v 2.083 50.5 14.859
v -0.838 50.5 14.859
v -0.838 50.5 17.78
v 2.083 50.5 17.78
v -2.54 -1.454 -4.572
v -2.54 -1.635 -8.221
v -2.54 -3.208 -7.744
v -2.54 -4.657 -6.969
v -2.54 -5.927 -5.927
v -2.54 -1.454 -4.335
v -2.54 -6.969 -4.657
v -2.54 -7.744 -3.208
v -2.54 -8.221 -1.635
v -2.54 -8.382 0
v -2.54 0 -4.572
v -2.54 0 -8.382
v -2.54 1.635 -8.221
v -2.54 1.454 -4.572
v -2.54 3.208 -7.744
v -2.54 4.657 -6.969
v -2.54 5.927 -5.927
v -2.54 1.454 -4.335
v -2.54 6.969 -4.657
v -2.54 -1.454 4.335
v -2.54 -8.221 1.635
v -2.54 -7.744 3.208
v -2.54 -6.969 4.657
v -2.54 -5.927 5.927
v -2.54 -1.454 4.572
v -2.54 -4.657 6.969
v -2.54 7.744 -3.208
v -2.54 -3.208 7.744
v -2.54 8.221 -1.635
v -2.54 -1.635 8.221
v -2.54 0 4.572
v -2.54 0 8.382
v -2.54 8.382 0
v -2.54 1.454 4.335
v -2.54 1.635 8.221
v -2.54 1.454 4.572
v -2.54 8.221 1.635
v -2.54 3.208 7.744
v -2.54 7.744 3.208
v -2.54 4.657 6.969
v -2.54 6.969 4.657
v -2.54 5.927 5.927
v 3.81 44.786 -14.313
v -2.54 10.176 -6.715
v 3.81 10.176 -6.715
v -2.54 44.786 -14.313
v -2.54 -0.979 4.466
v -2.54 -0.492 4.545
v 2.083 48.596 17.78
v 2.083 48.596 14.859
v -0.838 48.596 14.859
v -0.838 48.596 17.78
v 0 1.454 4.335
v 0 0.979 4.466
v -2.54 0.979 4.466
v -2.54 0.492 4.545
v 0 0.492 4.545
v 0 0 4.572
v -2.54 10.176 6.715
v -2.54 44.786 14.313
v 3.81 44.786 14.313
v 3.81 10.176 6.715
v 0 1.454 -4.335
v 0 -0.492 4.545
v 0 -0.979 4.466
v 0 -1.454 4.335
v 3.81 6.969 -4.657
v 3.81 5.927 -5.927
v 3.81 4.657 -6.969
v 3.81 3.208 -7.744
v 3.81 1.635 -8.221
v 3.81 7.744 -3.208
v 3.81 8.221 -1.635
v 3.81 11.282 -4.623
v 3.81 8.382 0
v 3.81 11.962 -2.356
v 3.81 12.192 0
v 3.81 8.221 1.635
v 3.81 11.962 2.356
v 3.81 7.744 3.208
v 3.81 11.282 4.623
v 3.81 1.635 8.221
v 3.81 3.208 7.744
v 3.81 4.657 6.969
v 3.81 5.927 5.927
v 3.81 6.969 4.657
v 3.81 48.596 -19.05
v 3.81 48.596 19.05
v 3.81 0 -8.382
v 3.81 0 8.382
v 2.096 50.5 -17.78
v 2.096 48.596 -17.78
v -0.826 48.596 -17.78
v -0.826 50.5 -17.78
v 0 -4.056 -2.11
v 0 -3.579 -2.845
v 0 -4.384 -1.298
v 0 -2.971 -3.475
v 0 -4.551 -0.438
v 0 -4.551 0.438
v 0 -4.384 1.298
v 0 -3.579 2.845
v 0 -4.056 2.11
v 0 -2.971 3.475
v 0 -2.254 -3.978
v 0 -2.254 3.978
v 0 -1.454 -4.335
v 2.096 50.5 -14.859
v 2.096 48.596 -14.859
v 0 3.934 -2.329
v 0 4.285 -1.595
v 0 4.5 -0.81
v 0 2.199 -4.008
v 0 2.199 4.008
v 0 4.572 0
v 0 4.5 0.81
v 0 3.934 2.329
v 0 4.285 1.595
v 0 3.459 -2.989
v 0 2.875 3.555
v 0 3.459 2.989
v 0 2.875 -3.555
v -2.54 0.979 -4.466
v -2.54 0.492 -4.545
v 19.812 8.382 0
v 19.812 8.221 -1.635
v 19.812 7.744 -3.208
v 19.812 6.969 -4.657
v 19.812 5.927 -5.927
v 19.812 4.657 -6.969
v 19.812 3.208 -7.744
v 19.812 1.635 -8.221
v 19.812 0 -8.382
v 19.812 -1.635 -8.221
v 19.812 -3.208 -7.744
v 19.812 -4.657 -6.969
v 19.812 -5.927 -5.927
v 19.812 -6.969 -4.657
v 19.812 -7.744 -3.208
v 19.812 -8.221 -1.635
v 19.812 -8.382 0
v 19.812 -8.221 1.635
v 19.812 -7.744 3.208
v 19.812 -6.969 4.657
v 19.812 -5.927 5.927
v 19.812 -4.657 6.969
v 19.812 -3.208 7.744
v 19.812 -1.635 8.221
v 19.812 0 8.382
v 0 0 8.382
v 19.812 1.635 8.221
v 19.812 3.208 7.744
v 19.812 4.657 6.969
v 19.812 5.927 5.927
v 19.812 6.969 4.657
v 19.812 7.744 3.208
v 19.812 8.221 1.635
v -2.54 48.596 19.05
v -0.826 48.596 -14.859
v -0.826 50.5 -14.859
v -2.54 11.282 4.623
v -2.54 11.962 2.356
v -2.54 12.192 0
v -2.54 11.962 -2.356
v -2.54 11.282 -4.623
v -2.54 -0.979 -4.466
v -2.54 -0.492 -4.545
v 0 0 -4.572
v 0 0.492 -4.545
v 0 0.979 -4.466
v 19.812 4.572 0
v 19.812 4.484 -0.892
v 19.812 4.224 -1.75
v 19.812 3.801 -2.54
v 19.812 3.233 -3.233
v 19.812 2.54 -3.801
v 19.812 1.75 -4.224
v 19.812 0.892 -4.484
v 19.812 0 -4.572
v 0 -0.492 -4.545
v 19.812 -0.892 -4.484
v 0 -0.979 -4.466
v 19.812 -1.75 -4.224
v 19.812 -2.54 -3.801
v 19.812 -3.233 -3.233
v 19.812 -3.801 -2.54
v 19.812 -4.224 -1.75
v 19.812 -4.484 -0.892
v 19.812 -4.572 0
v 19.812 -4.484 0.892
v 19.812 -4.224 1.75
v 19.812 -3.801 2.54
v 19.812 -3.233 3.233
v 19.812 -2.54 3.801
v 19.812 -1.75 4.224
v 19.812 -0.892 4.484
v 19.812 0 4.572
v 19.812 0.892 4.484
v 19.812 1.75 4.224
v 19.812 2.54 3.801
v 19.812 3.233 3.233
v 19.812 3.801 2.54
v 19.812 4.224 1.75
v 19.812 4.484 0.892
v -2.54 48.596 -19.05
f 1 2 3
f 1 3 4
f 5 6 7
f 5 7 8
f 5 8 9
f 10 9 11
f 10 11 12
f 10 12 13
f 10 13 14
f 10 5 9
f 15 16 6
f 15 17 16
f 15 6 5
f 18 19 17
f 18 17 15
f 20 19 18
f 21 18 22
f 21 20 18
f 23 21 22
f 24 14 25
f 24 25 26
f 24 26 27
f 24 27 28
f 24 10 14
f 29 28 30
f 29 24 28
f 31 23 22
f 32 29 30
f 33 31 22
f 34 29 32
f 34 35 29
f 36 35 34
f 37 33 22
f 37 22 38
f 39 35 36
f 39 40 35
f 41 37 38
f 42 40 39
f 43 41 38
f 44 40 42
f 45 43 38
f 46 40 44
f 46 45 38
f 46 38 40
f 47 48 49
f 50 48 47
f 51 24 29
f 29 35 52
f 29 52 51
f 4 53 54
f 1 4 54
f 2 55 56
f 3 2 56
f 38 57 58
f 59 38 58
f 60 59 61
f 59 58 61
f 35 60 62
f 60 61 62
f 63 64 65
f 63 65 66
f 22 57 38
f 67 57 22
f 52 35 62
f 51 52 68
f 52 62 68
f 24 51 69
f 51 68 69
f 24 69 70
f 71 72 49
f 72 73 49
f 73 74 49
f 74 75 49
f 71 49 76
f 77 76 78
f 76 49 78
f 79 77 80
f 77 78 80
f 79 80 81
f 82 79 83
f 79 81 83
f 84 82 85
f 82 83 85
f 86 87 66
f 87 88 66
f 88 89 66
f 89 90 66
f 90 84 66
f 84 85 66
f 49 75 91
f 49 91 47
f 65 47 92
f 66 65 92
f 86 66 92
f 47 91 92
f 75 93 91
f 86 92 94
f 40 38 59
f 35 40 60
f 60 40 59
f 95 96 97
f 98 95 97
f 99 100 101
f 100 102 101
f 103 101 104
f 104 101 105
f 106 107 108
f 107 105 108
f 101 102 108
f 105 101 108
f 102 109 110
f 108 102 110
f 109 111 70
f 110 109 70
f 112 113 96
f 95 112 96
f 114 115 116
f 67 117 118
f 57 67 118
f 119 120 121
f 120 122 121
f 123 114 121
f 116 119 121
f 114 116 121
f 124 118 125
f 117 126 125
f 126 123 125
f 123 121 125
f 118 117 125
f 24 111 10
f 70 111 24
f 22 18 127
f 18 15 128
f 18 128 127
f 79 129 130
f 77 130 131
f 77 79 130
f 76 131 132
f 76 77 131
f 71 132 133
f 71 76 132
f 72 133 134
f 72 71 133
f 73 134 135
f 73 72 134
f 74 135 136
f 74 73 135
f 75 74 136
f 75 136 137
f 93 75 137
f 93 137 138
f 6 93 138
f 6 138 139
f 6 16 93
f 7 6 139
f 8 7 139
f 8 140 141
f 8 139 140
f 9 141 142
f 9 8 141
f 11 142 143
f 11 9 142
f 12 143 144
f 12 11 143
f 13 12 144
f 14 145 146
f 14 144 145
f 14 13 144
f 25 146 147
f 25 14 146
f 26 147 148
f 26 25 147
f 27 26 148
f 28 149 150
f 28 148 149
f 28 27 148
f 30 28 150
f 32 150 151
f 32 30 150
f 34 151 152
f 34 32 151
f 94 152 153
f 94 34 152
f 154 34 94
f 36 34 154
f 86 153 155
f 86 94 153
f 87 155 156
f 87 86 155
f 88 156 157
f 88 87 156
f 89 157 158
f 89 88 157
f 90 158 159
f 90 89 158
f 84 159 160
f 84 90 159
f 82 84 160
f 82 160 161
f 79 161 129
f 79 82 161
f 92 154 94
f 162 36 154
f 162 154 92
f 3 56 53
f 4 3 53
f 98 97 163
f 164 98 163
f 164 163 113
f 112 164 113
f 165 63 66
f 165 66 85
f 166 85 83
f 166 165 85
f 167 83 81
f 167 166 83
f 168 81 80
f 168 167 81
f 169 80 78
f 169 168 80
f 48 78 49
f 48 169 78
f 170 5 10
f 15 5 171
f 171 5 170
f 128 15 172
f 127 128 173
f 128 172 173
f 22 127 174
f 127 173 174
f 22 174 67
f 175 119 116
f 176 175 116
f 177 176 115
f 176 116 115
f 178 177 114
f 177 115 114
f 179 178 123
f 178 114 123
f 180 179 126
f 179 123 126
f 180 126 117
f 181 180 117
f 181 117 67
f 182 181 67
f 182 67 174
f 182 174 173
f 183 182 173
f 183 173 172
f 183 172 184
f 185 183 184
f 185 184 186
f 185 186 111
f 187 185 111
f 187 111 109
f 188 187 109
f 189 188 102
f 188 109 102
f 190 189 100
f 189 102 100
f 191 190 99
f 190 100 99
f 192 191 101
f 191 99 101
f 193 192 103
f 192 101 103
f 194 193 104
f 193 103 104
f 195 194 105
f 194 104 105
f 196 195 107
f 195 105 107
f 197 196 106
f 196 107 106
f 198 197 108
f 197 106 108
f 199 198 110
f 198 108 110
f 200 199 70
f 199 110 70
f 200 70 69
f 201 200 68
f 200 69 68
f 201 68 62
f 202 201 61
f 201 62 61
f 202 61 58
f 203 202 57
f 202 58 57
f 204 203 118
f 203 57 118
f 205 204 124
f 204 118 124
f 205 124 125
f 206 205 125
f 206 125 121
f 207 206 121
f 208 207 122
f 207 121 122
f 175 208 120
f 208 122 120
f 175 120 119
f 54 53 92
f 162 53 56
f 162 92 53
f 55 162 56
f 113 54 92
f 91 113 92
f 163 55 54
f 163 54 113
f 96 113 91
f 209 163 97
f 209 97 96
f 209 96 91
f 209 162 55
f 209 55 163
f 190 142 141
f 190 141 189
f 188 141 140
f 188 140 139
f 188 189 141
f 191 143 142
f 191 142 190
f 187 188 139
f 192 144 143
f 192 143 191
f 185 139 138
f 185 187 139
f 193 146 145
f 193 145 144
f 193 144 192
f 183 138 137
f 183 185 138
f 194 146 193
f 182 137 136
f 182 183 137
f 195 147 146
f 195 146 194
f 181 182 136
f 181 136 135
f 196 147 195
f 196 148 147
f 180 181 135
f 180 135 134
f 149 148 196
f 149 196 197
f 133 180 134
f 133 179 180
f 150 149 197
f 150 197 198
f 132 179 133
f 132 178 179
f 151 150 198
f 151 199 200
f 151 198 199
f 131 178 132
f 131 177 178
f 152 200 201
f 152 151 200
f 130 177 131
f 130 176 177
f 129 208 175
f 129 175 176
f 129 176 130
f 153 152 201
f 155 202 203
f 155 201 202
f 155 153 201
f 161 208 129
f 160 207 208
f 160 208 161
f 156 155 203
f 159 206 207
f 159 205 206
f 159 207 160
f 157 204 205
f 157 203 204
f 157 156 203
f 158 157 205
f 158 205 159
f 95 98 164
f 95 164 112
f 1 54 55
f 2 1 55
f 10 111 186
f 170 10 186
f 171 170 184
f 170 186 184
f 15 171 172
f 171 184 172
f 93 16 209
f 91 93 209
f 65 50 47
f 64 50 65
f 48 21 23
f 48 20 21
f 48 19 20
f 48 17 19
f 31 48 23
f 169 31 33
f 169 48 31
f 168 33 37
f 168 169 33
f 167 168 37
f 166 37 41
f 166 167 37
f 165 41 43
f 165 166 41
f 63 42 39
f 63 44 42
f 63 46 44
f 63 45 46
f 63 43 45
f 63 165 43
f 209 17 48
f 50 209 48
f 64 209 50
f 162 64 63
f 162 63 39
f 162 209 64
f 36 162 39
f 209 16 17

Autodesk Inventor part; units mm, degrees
ref_plane "YZ Plane" through (0, 0, 0) normal (1, 0, 0) x (0, 1, 0)
ref_plane "XZ Plane" through (0, 0, 0) normal (0, 1, 0) x (-1, 0, 0)
ref_plane "XY Plane" through (0, 0, 0) normal (0, 0, 1) x (1, 0, 0)
sketch "Sketch1" plane through (0, 0, 0) normal (1, 0, 0) x (0, 1, 0)
  circle A0 centre (0, 0) radius 4.572
  circle A1 centre (0, 0) radius 8.382
  dimension "d0" = 9.144
  dimension "d1" = 3.81
extrude "Extrusion1" add sketch "Sketch1" along normal blind 19.812
sketch "Sketch2" plane through (0, 0, 0) normal (-1, 0, 0) x (0, 0, 1)
  circle A0 centre (0, 0) radius 8.382
  circle A1 centre (0, 0) radius 7.747
  circle A2 centre (0, 0) radius 8.382 projected
  dimension "d42" = 0
extrude "Extrusion2" add sketch "Sketch2" along normal blind 2.54 contours A0 | A1
sketch "Sketch3" plane through (-2.54, 0, 0) normal (-1, 0, 0) x (0, 0, 1)
  line L0 (19.05, 48.5955) -> (-19.05, 48.5955)
  circle A0 centre (0, 0) radius 8.382 projected
  line L1 (8.382, 0) -> (19.05, 48.5955)
  line L2 (-8.382, 0) -> (-19.05, 48.5955)
  arc A1 (8.382, 0) -> (-8.382, 0) centre (0, 0) ccw
  line L3 (-14.3129, 44.7855) -> (14.3129, 44.7855)
  line L4 (14.3129, 44.7855) -> (6.7152, 10.176)
  arc A2 (6.7152, 10.176) -> (-6.7152, 10.176) centre (0, 0) ccw
  line L5 (-6.7152, 10.176) -> (-14.3129, 44.7855)
  dimension "d6" = 38.1
  dimension "d7" = 19.05
  dimension "d8" = 3.81
extrude "Extrusion3" add sketch "Sketch3" against normal blind 6.35 contours L1 A0 L2 L0
sketch "Sketch6" plane through (-2.54, 44.7855, -14.3129) normal (0, -1, 0) x (1, 0, 0)
  line L0 (6.35, 32.4159) -> (26.9875, 32.4159) projected
  line L1 (13.4874, 32.4159) -> (13.4874, 26.0989)
  line L2 (26.9875, 32.4159) -> (26.9875, -3.9117) projected
  point P0 (2.54, 14.3129)
  dimension "d20" = 13.5001
sketch "Sketch10" plane through (0, 0, 0) normal (1, 0, 0) x (0, 0, -1)
  circle A0 centre (0, 0) radius 1.4542
  line L0 (-4.572, 1.4542) -> (4.572, 1.4542)
  line L1 (4.572, 1.4542) -> (4.572, -1.4542)
  line L2 (4.572, -1.4542) -> (-4.572, -1.4542)
  line L3 (-4.572, -1.4542) -> (-4.572, 1.4542)
  circle A1 centre (0, 0) radius 4.572 projected
  dimension "d43" = 0
  dimension "d44" = 0
extrude "Extrusion7" cut sketch "Sketch10" against normal blind 22.225 contours A0 | A0 L0 A1 L2 | A0 L2 A1 L0 | A1 L3 L0 | L0 L1 A1 | A1 L1 L2 | L2 L3 A1
sketch "Sketch13" plane through (-2.54, 48.5955, 19.05) normal (0, 1, 0) x (1, 0, 0)
  line L0 (4.6355, 36.83) -> (1.7145, 36.83)
  line L1 (1.7145, 36.83) -> (1.7145, 33.909)
  line L2 (1.7145, 33.909) -> (4.6355, 33.909)
  line L3 (4.6355, 33.909) -> (4.6355, 36.83)
  line L4 (6.35, 38.1) -> (6.35, 0) projected
  line L5 (0, 38.1) -> (6.35, 38.1) projected
  line L6 (4.6228, 4.191) -> (1.7018, 4.191)
  line L7 (1.7018, 4.191) -> (1.7018, 1.27)
  line L8 (1.7018, 1.27) -> (4.6228, 1.27)
  line L9 (4.6228, 1.27) -> (4.6228, 4.191)
  line L10 (0, 0) -> (6.35, 0) projected
  point P0 (2.54, 19.05)
  dimension "d32" = 2.921
  dimension "d33" = 2.921
  dimension "d34" = 1.7145
  dimension "d35" = 1.27
  dimension "d36" = 2.921
  dimension "d37" = 2.921
  dimension "d38" = 1.7272
  dimension "d39" = 1.27
extrude "Extrusion9" add sketch "Sketch13" along normal blind 1.905
sketch "Sketch14" plane through (0, 0, 0) normal (-1, 0, 0) x (0, 0, 1)
  arc A0 (4.3346, -1.4542) -> (4.572, 0) centre (0, 0) ccw projected
  line L0 (4.3346, -1.4542) -> (4.572, -1.4542) projected
  line L1 (4.572, -1.4542) -> (4.572, 0) projected
  arc A1 (4.572, 0) -> (4.3346, 1.4542) centre (0, 0) ccw projected
  line L2 (4.572, 0) -> (4.572, 1.4542) projected
  line L3 (4.572, 1.4542) -> (4.3346, 1.4542) projected
  arc A2 (-4.572, 0) -> (-4.3346, -1.4542) centre (0, 0) ccw projected
  line L4 (-4.572, 0) -> (-4.572, -1.4542) projected
  line L5 (-4.572, -1.4542) -> (-4.3346, -1.4542) projected
  arc A3 (-4.3346, 1.4542) -> (-4.572, 0) centre (0, 0) ccw projected
  line L6 (-4.3346, 1.4542) -> (-4.572, 1.4542) projected
  line L7 (-4.572, 1.4542) -> (-4.572, 0) projected
extrude "Extrusion10" add sketch "Sketch14" along normal blind 2.54
properties part number "BasicThrustMotorHousingJustMotor"
